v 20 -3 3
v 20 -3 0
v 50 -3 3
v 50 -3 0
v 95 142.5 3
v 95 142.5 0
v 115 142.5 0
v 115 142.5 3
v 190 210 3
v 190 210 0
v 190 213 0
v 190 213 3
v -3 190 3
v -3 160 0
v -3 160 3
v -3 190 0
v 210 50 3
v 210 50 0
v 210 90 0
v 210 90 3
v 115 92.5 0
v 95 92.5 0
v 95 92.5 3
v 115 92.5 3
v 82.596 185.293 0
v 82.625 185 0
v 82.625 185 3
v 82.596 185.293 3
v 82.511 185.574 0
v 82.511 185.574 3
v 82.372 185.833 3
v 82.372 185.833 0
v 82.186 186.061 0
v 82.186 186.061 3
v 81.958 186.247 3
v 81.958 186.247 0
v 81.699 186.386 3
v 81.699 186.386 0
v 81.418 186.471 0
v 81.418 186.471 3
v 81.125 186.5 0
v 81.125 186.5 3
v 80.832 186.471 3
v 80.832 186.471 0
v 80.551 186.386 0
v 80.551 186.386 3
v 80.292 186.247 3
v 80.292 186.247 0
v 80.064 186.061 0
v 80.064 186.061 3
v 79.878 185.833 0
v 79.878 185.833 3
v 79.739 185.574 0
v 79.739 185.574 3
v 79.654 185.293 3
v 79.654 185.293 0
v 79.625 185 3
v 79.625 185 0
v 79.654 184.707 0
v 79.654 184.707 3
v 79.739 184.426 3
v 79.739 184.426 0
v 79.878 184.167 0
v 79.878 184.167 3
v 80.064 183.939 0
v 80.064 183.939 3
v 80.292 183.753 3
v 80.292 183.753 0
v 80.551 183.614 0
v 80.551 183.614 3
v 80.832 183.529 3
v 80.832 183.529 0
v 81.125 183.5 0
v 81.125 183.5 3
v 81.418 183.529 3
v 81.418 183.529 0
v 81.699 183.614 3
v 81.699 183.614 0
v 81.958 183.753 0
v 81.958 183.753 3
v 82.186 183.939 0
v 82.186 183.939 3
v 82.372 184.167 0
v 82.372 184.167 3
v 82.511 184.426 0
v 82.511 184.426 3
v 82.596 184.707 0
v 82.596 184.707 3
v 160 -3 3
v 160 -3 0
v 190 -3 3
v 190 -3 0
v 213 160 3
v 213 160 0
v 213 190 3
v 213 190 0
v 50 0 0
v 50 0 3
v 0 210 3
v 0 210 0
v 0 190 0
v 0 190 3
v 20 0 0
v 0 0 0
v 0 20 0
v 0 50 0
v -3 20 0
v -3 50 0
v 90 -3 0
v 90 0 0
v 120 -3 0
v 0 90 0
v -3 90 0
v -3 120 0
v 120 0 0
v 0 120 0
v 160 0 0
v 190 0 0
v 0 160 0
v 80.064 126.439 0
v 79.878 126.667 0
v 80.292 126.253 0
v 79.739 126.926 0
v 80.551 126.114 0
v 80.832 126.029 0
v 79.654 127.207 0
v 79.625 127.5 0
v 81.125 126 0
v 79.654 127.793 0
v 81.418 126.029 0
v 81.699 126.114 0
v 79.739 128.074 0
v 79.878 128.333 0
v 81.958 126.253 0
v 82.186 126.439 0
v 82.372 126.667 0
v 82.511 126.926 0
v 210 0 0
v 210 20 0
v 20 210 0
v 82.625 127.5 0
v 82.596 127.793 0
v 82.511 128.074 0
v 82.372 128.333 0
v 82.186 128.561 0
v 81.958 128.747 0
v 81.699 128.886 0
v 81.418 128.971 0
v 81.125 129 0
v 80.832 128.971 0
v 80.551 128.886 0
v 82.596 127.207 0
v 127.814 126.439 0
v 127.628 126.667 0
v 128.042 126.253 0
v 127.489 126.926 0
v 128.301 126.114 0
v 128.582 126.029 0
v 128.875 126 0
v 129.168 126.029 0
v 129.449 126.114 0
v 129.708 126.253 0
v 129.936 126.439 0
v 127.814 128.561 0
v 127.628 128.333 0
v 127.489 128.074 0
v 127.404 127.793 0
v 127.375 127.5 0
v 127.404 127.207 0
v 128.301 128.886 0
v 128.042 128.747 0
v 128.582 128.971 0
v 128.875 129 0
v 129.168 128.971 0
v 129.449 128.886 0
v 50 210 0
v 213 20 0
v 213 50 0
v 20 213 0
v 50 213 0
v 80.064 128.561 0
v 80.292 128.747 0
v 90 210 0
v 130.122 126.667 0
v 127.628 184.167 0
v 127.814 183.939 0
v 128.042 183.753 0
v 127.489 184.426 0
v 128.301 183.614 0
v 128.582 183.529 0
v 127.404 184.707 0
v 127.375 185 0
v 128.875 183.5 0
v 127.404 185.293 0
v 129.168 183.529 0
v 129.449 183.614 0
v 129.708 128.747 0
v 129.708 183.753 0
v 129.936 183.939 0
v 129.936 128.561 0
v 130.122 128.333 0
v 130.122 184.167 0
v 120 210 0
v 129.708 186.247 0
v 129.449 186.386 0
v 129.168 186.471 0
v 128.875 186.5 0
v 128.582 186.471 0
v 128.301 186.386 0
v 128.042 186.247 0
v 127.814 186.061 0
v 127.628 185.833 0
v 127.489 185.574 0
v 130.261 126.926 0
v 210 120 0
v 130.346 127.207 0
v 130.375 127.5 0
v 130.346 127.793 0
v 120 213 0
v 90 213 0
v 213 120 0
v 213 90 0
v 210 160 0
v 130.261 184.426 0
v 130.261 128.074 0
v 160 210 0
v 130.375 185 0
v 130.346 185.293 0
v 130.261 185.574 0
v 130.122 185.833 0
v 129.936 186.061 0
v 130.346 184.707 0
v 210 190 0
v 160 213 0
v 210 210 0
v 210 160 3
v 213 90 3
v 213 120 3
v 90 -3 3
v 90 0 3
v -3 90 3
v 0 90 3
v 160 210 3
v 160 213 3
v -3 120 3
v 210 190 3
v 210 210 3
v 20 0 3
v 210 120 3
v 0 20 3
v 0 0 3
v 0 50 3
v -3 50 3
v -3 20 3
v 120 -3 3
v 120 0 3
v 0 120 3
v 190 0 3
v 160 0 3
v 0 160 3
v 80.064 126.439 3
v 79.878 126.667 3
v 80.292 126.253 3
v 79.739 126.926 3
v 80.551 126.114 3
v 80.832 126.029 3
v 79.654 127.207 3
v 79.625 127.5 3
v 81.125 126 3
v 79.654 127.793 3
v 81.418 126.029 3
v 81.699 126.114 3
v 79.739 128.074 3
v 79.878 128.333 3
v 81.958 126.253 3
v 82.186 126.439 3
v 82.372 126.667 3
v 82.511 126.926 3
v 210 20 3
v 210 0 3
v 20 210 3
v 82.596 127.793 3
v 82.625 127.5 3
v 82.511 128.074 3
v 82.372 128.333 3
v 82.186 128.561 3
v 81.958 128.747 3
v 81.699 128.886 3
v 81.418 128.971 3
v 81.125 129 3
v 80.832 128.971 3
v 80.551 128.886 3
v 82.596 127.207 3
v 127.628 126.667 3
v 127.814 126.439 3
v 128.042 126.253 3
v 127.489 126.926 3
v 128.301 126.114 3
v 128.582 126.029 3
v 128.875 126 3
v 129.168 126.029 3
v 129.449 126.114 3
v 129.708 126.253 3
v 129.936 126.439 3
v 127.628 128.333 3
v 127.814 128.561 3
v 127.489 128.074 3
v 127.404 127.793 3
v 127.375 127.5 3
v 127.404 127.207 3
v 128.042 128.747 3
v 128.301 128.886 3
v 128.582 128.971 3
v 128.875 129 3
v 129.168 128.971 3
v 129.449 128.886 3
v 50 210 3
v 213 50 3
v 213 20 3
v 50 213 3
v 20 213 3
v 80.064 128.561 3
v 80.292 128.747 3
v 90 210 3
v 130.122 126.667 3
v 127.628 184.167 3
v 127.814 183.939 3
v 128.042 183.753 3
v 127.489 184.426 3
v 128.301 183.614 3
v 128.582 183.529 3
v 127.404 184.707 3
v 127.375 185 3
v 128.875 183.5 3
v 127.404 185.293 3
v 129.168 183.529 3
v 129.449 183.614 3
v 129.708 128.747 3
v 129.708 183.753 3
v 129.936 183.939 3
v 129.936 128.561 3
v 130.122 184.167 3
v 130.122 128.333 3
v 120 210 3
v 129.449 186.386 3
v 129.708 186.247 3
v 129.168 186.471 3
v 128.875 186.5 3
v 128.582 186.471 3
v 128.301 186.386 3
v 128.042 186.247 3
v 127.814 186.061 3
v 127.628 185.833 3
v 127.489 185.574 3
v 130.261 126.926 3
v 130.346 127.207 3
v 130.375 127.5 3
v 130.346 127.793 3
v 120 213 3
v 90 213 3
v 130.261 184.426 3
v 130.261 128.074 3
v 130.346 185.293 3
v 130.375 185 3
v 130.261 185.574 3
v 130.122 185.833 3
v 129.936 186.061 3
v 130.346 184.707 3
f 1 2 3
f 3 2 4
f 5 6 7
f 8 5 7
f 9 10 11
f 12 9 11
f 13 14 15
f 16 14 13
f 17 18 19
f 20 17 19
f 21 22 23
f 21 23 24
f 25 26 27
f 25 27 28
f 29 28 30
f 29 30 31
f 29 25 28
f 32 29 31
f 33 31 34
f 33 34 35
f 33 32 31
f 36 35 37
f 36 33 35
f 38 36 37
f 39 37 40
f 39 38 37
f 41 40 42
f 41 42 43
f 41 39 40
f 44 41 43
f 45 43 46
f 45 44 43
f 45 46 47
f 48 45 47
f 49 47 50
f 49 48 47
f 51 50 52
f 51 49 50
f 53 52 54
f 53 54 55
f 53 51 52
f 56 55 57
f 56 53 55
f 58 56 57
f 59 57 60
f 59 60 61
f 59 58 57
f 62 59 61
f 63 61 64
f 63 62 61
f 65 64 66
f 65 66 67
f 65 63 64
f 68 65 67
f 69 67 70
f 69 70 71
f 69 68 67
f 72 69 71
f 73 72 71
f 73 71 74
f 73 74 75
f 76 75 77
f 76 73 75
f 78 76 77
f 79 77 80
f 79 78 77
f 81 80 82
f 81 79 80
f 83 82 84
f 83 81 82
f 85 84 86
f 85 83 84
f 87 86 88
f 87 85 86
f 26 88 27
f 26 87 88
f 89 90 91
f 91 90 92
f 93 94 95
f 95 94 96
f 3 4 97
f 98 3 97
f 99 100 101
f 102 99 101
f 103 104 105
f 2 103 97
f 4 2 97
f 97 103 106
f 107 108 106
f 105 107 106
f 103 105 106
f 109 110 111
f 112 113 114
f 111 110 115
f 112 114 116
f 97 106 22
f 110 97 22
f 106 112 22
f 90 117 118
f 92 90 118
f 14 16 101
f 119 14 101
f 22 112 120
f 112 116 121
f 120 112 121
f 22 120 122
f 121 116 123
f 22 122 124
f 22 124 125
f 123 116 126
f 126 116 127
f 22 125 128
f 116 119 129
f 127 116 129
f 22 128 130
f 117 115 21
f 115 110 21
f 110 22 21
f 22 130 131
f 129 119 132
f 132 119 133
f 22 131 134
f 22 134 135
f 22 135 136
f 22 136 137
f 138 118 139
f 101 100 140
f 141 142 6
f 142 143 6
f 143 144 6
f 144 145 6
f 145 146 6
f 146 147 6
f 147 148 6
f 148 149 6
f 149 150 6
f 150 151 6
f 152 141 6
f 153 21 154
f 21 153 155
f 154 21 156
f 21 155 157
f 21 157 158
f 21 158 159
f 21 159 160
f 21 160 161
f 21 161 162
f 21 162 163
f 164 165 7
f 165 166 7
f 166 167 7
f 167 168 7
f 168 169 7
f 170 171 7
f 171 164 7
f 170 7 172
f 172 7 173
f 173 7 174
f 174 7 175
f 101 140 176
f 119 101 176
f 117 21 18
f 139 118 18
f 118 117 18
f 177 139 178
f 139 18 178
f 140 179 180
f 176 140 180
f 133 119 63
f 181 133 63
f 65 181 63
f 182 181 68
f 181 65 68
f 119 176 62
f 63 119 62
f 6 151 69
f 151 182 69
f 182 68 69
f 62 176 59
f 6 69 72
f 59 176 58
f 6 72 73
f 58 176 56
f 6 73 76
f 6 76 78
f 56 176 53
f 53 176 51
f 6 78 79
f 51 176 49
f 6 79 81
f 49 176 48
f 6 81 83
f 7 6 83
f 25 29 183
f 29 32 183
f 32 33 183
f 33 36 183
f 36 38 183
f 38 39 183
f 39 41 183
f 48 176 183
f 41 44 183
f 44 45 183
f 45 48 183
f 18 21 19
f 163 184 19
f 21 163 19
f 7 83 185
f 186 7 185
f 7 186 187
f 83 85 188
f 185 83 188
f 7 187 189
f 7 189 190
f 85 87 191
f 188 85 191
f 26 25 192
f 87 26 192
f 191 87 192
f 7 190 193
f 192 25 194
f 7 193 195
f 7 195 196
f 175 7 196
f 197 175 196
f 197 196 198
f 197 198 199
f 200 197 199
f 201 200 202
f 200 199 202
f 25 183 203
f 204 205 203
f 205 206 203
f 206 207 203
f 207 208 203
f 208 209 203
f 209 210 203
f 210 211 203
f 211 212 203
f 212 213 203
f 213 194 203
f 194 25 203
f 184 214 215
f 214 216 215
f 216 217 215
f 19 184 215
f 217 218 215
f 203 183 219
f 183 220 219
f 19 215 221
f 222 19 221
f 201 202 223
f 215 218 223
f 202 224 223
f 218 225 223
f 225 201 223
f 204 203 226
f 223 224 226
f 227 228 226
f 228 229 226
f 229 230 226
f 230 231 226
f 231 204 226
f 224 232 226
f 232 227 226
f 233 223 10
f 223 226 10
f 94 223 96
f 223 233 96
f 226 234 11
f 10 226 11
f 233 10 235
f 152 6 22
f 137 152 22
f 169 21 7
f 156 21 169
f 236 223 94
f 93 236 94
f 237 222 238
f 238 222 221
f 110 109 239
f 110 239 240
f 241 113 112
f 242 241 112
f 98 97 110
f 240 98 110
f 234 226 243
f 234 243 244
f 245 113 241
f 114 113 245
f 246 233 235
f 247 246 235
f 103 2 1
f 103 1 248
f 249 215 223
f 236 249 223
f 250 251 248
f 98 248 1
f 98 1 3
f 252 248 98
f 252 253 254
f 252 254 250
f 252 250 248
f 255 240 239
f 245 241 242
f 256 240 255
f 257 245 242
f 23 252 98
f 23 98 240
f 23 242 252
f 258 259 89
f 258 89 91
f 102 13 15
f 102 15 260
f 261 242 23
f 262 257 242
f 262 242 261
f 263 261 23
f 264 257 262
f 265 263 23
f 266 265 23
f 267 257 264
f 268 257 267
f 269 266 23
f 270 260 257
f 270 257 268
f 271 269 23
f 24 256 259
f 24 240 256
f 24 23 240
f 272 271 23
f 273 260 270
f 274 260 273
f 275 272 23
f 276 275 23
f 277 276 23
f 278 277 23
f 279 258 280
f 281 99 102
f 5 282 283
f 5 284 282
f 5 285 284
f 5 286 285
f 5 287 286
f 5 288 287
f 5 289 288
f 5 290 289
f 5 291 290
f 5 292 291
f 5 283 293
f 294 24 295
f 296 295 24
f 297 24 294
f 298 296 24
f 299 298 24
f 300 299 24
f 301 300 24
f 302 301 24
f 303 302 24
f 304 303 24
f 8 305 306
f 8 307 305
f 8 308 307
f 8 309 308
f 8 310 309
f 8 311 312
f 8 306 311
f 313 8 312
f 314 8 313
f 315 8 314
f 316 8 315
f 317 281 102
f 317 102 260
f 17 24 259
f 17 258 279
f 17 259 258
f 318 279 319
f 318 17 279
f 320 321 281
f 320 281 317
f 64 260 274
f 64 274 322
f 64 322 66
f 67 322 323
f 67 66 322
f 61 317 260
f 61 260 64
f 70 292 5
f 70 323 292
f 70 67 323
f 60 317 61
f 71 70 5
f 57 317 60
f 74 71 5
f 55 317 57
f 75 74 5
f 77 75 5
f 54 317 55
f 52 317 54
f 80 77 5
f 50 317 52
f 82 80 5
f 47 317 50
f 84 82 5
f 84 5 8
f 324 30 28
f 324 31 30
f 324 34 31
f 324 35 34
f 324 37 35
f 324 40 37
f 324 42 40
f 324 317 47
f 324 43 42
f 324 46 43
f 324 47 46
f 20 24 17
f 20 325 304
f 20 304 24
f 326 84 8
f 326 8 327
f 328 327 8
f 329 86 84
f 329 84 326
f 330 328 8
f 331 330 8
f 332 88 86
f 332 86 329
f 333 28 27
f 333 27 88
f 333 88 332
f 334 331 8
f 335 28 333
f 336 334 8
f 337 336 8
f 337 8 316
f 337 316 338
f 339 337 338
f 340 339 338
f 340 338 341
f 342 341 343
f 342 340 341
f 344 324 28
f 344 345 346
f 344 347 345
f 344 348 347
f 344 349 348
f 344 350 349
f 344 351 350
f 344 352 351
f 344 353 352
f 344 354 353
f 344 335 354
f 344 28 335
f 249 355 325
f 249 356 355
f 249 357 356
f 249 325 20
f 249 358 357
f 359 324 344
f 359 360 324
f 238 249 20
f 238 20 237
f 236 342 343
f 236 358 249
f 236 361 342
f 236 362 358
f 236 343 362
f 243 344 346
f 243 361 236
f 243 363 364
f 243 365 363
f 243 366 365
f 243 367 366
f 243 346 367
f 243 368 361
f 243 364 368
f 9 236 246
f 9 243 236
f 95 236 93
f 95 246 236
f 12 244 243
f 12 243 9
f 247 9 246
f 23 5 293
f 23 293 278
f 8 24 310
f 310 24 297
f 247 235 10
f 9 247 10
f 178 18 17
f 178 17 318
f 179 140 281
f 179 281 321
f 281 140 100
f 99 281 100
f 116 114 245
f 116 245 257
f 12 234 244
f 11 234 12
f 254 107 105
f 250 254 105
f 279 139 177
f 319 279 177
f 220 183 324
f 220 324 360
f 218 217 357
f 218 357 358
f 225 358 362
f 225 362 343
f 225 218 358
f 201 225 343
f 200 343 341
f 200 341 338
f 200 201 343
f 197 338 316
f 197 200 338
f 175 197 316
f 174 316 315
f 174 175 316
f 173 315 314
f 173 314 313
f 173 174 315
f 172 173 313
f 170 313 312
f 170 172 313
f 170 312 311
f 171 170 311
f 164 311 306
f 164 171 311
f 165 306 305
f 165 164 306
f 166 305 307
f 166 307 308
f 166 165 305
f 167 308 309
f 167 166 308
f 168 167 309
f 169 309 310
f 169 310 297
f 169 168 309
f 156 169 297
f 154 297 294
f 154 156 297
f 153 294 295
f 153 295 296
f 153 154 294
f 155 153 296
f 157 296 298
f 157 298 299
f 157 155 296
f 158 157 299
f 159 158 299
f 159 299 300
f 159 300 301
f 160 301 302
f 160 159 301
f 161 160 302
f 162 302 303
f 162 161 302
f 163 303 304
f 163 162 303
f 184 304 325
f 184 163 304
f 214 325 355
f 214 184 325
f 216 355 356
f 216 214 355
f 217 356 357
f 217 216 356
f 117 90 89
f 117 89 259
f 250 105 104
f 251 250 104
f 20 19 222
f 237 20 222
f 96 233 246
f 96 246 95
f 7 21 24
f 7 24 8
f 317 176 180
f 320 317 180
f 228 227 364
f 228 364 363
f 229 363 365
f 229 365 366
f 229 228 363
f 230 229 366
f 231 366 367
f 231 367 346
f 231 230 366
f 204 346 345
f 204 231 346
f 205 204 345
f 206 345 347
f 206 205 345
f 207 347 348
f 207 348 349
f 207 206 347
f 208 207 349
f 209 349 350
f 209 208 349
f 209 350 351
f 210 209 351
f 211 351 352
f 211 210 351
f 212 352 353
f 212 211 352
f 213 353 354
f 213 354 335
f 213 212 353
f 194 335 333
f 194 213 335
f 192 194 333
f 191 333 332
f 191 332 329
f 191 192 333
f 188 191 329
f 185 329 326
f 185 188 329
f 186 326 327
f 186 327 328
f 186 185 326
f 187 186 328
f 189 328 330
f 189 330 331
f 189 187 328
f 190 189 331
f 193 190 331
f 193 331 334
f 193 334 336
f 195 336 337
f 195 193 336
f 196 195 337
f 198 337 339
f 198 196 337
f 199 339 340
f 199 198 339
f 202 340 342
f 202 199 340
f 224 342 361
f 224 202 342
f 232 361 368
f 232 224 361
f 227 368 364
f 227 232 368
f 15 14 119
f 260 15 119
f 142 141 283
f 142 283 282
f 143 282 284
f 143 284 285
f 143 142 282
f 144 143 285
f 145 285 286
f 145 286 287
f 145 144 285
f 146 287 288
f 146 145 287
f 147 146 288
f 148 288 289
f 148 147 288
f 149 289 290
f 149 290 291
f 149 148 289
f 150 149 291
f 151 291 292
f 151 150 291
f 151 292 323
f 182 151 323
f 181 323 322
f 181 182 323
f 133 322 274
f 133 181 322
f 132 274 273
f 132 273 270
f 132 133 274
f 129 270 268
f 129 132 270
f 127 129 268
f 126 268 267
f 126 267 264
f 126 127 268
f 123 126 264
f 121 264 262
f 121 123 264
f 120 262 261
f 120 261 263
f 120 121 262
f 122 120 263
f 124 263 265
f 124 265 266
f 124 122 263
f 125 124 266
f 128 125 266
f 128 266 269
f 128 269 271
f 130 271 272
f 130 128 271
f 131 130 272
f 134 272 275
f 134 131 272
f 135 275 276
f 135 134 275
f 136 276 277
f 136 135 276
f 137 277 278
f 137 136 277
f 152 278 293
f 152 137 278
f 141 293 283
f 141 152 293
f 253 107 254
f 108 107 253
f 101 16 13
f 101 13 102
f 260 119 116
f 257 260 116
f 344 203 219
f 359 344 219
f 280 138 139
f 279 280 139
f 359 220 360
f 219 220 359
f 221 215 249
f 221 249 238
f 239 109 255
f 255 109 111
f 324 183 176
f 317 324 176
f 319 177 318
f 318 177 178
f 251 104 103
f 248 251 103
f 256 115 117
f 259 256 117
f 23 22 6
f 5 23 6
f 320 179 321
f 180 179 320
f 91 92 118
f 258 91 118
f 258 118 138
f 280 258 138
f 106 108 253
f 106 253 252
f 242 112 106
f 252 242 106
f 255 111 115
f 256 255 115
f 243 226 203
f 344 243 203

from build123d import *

# Parameters (mm, degrees)
F0_R     = 1.5
F0_W     = 20
F0_H     = 50
F0_W_2   = 30
F0_H_2   = 3
F0_W_3   = 3
F0_H_3   = 30
F1_DEPTH = 3


with BuildPart() as f1:
    # F0 (on Top) → F1 (new body)
    with BuildSketch(Plane.XY):
        Polygon((0, 20), (0, 0), (20, 0), (50, 0), (90, 0), (120, 0), (160, 0), (190, 0), (210, 0), (210, 20), (210, 50), (210, 90), (210, 120), (210, 160), (210, 190), (210, 210), (190, 210), (160, 210), (120, 210), (90, 210), (50, 210), (20, 210), (0, 210), (0, 190), (0, 160), (0, 120), (0, 90), (0, 50), align=None)
        with Locations((81.125, 127.5)):
            Circle(F0_R, mode=Mode.SUBTRACT)
        with Locations((81.125, 185)):
            Circle(F0_R, mode=Mode.SUBTRACT)
        with Locations((105, 117.5)):
            Rectangle(F0_W, F0_H, mode=Mode.SUBTRACT)
        with Locations((128.875, 127.5)):
            Circle(F0_R, mode=Mode.SUBTRACT)
        with Locations((128.875, 185)):
            Circle(F0_R, mode=Mode.SUBTRACT)
        with Locations((35, -1.5)):
            Rectangle(F0_W_2, F0_H_2)
        with Locations((-1.5, 35)):
            Rectangle(F0_W_3, F0_H_3)
        with Locations((105, -1.5)):
            Rectangle(F0_W_2, F0_H_2)
        with Locations((-1.5, 105)):
            Rectangle(F0_W_3, F0_H_3)
        with Locations((175, -1.5)):
            Rectangle(F0_W_2, F0_H_2)
        with Locations((-1.5, 175)):
            Rectangle(F0_W_3, F0_H_3)
        with Locations((211.5, 35)):
            Rectangle(F0_W_3, F0_H_3)
        with Locations((35, 211.5)):
            Rectangle(F0_W_2, F0_H_2)
        with Locations((211.5, 105)):
            Rectangle(F0_W_3, F0_H_3)
        with Locations((105, 211.5)):
            Rectangle(F0_W_2, F0_H_2)
        with Locations((211.5, 175)):
            Rectangle(F0_W_3, F0_H_3)
        with Locations((175, 211.5)):
            Rectangle(F0_W_2, F0_H_2)
    extrude(amount=F1_DEPTH)


solid = f1.part
